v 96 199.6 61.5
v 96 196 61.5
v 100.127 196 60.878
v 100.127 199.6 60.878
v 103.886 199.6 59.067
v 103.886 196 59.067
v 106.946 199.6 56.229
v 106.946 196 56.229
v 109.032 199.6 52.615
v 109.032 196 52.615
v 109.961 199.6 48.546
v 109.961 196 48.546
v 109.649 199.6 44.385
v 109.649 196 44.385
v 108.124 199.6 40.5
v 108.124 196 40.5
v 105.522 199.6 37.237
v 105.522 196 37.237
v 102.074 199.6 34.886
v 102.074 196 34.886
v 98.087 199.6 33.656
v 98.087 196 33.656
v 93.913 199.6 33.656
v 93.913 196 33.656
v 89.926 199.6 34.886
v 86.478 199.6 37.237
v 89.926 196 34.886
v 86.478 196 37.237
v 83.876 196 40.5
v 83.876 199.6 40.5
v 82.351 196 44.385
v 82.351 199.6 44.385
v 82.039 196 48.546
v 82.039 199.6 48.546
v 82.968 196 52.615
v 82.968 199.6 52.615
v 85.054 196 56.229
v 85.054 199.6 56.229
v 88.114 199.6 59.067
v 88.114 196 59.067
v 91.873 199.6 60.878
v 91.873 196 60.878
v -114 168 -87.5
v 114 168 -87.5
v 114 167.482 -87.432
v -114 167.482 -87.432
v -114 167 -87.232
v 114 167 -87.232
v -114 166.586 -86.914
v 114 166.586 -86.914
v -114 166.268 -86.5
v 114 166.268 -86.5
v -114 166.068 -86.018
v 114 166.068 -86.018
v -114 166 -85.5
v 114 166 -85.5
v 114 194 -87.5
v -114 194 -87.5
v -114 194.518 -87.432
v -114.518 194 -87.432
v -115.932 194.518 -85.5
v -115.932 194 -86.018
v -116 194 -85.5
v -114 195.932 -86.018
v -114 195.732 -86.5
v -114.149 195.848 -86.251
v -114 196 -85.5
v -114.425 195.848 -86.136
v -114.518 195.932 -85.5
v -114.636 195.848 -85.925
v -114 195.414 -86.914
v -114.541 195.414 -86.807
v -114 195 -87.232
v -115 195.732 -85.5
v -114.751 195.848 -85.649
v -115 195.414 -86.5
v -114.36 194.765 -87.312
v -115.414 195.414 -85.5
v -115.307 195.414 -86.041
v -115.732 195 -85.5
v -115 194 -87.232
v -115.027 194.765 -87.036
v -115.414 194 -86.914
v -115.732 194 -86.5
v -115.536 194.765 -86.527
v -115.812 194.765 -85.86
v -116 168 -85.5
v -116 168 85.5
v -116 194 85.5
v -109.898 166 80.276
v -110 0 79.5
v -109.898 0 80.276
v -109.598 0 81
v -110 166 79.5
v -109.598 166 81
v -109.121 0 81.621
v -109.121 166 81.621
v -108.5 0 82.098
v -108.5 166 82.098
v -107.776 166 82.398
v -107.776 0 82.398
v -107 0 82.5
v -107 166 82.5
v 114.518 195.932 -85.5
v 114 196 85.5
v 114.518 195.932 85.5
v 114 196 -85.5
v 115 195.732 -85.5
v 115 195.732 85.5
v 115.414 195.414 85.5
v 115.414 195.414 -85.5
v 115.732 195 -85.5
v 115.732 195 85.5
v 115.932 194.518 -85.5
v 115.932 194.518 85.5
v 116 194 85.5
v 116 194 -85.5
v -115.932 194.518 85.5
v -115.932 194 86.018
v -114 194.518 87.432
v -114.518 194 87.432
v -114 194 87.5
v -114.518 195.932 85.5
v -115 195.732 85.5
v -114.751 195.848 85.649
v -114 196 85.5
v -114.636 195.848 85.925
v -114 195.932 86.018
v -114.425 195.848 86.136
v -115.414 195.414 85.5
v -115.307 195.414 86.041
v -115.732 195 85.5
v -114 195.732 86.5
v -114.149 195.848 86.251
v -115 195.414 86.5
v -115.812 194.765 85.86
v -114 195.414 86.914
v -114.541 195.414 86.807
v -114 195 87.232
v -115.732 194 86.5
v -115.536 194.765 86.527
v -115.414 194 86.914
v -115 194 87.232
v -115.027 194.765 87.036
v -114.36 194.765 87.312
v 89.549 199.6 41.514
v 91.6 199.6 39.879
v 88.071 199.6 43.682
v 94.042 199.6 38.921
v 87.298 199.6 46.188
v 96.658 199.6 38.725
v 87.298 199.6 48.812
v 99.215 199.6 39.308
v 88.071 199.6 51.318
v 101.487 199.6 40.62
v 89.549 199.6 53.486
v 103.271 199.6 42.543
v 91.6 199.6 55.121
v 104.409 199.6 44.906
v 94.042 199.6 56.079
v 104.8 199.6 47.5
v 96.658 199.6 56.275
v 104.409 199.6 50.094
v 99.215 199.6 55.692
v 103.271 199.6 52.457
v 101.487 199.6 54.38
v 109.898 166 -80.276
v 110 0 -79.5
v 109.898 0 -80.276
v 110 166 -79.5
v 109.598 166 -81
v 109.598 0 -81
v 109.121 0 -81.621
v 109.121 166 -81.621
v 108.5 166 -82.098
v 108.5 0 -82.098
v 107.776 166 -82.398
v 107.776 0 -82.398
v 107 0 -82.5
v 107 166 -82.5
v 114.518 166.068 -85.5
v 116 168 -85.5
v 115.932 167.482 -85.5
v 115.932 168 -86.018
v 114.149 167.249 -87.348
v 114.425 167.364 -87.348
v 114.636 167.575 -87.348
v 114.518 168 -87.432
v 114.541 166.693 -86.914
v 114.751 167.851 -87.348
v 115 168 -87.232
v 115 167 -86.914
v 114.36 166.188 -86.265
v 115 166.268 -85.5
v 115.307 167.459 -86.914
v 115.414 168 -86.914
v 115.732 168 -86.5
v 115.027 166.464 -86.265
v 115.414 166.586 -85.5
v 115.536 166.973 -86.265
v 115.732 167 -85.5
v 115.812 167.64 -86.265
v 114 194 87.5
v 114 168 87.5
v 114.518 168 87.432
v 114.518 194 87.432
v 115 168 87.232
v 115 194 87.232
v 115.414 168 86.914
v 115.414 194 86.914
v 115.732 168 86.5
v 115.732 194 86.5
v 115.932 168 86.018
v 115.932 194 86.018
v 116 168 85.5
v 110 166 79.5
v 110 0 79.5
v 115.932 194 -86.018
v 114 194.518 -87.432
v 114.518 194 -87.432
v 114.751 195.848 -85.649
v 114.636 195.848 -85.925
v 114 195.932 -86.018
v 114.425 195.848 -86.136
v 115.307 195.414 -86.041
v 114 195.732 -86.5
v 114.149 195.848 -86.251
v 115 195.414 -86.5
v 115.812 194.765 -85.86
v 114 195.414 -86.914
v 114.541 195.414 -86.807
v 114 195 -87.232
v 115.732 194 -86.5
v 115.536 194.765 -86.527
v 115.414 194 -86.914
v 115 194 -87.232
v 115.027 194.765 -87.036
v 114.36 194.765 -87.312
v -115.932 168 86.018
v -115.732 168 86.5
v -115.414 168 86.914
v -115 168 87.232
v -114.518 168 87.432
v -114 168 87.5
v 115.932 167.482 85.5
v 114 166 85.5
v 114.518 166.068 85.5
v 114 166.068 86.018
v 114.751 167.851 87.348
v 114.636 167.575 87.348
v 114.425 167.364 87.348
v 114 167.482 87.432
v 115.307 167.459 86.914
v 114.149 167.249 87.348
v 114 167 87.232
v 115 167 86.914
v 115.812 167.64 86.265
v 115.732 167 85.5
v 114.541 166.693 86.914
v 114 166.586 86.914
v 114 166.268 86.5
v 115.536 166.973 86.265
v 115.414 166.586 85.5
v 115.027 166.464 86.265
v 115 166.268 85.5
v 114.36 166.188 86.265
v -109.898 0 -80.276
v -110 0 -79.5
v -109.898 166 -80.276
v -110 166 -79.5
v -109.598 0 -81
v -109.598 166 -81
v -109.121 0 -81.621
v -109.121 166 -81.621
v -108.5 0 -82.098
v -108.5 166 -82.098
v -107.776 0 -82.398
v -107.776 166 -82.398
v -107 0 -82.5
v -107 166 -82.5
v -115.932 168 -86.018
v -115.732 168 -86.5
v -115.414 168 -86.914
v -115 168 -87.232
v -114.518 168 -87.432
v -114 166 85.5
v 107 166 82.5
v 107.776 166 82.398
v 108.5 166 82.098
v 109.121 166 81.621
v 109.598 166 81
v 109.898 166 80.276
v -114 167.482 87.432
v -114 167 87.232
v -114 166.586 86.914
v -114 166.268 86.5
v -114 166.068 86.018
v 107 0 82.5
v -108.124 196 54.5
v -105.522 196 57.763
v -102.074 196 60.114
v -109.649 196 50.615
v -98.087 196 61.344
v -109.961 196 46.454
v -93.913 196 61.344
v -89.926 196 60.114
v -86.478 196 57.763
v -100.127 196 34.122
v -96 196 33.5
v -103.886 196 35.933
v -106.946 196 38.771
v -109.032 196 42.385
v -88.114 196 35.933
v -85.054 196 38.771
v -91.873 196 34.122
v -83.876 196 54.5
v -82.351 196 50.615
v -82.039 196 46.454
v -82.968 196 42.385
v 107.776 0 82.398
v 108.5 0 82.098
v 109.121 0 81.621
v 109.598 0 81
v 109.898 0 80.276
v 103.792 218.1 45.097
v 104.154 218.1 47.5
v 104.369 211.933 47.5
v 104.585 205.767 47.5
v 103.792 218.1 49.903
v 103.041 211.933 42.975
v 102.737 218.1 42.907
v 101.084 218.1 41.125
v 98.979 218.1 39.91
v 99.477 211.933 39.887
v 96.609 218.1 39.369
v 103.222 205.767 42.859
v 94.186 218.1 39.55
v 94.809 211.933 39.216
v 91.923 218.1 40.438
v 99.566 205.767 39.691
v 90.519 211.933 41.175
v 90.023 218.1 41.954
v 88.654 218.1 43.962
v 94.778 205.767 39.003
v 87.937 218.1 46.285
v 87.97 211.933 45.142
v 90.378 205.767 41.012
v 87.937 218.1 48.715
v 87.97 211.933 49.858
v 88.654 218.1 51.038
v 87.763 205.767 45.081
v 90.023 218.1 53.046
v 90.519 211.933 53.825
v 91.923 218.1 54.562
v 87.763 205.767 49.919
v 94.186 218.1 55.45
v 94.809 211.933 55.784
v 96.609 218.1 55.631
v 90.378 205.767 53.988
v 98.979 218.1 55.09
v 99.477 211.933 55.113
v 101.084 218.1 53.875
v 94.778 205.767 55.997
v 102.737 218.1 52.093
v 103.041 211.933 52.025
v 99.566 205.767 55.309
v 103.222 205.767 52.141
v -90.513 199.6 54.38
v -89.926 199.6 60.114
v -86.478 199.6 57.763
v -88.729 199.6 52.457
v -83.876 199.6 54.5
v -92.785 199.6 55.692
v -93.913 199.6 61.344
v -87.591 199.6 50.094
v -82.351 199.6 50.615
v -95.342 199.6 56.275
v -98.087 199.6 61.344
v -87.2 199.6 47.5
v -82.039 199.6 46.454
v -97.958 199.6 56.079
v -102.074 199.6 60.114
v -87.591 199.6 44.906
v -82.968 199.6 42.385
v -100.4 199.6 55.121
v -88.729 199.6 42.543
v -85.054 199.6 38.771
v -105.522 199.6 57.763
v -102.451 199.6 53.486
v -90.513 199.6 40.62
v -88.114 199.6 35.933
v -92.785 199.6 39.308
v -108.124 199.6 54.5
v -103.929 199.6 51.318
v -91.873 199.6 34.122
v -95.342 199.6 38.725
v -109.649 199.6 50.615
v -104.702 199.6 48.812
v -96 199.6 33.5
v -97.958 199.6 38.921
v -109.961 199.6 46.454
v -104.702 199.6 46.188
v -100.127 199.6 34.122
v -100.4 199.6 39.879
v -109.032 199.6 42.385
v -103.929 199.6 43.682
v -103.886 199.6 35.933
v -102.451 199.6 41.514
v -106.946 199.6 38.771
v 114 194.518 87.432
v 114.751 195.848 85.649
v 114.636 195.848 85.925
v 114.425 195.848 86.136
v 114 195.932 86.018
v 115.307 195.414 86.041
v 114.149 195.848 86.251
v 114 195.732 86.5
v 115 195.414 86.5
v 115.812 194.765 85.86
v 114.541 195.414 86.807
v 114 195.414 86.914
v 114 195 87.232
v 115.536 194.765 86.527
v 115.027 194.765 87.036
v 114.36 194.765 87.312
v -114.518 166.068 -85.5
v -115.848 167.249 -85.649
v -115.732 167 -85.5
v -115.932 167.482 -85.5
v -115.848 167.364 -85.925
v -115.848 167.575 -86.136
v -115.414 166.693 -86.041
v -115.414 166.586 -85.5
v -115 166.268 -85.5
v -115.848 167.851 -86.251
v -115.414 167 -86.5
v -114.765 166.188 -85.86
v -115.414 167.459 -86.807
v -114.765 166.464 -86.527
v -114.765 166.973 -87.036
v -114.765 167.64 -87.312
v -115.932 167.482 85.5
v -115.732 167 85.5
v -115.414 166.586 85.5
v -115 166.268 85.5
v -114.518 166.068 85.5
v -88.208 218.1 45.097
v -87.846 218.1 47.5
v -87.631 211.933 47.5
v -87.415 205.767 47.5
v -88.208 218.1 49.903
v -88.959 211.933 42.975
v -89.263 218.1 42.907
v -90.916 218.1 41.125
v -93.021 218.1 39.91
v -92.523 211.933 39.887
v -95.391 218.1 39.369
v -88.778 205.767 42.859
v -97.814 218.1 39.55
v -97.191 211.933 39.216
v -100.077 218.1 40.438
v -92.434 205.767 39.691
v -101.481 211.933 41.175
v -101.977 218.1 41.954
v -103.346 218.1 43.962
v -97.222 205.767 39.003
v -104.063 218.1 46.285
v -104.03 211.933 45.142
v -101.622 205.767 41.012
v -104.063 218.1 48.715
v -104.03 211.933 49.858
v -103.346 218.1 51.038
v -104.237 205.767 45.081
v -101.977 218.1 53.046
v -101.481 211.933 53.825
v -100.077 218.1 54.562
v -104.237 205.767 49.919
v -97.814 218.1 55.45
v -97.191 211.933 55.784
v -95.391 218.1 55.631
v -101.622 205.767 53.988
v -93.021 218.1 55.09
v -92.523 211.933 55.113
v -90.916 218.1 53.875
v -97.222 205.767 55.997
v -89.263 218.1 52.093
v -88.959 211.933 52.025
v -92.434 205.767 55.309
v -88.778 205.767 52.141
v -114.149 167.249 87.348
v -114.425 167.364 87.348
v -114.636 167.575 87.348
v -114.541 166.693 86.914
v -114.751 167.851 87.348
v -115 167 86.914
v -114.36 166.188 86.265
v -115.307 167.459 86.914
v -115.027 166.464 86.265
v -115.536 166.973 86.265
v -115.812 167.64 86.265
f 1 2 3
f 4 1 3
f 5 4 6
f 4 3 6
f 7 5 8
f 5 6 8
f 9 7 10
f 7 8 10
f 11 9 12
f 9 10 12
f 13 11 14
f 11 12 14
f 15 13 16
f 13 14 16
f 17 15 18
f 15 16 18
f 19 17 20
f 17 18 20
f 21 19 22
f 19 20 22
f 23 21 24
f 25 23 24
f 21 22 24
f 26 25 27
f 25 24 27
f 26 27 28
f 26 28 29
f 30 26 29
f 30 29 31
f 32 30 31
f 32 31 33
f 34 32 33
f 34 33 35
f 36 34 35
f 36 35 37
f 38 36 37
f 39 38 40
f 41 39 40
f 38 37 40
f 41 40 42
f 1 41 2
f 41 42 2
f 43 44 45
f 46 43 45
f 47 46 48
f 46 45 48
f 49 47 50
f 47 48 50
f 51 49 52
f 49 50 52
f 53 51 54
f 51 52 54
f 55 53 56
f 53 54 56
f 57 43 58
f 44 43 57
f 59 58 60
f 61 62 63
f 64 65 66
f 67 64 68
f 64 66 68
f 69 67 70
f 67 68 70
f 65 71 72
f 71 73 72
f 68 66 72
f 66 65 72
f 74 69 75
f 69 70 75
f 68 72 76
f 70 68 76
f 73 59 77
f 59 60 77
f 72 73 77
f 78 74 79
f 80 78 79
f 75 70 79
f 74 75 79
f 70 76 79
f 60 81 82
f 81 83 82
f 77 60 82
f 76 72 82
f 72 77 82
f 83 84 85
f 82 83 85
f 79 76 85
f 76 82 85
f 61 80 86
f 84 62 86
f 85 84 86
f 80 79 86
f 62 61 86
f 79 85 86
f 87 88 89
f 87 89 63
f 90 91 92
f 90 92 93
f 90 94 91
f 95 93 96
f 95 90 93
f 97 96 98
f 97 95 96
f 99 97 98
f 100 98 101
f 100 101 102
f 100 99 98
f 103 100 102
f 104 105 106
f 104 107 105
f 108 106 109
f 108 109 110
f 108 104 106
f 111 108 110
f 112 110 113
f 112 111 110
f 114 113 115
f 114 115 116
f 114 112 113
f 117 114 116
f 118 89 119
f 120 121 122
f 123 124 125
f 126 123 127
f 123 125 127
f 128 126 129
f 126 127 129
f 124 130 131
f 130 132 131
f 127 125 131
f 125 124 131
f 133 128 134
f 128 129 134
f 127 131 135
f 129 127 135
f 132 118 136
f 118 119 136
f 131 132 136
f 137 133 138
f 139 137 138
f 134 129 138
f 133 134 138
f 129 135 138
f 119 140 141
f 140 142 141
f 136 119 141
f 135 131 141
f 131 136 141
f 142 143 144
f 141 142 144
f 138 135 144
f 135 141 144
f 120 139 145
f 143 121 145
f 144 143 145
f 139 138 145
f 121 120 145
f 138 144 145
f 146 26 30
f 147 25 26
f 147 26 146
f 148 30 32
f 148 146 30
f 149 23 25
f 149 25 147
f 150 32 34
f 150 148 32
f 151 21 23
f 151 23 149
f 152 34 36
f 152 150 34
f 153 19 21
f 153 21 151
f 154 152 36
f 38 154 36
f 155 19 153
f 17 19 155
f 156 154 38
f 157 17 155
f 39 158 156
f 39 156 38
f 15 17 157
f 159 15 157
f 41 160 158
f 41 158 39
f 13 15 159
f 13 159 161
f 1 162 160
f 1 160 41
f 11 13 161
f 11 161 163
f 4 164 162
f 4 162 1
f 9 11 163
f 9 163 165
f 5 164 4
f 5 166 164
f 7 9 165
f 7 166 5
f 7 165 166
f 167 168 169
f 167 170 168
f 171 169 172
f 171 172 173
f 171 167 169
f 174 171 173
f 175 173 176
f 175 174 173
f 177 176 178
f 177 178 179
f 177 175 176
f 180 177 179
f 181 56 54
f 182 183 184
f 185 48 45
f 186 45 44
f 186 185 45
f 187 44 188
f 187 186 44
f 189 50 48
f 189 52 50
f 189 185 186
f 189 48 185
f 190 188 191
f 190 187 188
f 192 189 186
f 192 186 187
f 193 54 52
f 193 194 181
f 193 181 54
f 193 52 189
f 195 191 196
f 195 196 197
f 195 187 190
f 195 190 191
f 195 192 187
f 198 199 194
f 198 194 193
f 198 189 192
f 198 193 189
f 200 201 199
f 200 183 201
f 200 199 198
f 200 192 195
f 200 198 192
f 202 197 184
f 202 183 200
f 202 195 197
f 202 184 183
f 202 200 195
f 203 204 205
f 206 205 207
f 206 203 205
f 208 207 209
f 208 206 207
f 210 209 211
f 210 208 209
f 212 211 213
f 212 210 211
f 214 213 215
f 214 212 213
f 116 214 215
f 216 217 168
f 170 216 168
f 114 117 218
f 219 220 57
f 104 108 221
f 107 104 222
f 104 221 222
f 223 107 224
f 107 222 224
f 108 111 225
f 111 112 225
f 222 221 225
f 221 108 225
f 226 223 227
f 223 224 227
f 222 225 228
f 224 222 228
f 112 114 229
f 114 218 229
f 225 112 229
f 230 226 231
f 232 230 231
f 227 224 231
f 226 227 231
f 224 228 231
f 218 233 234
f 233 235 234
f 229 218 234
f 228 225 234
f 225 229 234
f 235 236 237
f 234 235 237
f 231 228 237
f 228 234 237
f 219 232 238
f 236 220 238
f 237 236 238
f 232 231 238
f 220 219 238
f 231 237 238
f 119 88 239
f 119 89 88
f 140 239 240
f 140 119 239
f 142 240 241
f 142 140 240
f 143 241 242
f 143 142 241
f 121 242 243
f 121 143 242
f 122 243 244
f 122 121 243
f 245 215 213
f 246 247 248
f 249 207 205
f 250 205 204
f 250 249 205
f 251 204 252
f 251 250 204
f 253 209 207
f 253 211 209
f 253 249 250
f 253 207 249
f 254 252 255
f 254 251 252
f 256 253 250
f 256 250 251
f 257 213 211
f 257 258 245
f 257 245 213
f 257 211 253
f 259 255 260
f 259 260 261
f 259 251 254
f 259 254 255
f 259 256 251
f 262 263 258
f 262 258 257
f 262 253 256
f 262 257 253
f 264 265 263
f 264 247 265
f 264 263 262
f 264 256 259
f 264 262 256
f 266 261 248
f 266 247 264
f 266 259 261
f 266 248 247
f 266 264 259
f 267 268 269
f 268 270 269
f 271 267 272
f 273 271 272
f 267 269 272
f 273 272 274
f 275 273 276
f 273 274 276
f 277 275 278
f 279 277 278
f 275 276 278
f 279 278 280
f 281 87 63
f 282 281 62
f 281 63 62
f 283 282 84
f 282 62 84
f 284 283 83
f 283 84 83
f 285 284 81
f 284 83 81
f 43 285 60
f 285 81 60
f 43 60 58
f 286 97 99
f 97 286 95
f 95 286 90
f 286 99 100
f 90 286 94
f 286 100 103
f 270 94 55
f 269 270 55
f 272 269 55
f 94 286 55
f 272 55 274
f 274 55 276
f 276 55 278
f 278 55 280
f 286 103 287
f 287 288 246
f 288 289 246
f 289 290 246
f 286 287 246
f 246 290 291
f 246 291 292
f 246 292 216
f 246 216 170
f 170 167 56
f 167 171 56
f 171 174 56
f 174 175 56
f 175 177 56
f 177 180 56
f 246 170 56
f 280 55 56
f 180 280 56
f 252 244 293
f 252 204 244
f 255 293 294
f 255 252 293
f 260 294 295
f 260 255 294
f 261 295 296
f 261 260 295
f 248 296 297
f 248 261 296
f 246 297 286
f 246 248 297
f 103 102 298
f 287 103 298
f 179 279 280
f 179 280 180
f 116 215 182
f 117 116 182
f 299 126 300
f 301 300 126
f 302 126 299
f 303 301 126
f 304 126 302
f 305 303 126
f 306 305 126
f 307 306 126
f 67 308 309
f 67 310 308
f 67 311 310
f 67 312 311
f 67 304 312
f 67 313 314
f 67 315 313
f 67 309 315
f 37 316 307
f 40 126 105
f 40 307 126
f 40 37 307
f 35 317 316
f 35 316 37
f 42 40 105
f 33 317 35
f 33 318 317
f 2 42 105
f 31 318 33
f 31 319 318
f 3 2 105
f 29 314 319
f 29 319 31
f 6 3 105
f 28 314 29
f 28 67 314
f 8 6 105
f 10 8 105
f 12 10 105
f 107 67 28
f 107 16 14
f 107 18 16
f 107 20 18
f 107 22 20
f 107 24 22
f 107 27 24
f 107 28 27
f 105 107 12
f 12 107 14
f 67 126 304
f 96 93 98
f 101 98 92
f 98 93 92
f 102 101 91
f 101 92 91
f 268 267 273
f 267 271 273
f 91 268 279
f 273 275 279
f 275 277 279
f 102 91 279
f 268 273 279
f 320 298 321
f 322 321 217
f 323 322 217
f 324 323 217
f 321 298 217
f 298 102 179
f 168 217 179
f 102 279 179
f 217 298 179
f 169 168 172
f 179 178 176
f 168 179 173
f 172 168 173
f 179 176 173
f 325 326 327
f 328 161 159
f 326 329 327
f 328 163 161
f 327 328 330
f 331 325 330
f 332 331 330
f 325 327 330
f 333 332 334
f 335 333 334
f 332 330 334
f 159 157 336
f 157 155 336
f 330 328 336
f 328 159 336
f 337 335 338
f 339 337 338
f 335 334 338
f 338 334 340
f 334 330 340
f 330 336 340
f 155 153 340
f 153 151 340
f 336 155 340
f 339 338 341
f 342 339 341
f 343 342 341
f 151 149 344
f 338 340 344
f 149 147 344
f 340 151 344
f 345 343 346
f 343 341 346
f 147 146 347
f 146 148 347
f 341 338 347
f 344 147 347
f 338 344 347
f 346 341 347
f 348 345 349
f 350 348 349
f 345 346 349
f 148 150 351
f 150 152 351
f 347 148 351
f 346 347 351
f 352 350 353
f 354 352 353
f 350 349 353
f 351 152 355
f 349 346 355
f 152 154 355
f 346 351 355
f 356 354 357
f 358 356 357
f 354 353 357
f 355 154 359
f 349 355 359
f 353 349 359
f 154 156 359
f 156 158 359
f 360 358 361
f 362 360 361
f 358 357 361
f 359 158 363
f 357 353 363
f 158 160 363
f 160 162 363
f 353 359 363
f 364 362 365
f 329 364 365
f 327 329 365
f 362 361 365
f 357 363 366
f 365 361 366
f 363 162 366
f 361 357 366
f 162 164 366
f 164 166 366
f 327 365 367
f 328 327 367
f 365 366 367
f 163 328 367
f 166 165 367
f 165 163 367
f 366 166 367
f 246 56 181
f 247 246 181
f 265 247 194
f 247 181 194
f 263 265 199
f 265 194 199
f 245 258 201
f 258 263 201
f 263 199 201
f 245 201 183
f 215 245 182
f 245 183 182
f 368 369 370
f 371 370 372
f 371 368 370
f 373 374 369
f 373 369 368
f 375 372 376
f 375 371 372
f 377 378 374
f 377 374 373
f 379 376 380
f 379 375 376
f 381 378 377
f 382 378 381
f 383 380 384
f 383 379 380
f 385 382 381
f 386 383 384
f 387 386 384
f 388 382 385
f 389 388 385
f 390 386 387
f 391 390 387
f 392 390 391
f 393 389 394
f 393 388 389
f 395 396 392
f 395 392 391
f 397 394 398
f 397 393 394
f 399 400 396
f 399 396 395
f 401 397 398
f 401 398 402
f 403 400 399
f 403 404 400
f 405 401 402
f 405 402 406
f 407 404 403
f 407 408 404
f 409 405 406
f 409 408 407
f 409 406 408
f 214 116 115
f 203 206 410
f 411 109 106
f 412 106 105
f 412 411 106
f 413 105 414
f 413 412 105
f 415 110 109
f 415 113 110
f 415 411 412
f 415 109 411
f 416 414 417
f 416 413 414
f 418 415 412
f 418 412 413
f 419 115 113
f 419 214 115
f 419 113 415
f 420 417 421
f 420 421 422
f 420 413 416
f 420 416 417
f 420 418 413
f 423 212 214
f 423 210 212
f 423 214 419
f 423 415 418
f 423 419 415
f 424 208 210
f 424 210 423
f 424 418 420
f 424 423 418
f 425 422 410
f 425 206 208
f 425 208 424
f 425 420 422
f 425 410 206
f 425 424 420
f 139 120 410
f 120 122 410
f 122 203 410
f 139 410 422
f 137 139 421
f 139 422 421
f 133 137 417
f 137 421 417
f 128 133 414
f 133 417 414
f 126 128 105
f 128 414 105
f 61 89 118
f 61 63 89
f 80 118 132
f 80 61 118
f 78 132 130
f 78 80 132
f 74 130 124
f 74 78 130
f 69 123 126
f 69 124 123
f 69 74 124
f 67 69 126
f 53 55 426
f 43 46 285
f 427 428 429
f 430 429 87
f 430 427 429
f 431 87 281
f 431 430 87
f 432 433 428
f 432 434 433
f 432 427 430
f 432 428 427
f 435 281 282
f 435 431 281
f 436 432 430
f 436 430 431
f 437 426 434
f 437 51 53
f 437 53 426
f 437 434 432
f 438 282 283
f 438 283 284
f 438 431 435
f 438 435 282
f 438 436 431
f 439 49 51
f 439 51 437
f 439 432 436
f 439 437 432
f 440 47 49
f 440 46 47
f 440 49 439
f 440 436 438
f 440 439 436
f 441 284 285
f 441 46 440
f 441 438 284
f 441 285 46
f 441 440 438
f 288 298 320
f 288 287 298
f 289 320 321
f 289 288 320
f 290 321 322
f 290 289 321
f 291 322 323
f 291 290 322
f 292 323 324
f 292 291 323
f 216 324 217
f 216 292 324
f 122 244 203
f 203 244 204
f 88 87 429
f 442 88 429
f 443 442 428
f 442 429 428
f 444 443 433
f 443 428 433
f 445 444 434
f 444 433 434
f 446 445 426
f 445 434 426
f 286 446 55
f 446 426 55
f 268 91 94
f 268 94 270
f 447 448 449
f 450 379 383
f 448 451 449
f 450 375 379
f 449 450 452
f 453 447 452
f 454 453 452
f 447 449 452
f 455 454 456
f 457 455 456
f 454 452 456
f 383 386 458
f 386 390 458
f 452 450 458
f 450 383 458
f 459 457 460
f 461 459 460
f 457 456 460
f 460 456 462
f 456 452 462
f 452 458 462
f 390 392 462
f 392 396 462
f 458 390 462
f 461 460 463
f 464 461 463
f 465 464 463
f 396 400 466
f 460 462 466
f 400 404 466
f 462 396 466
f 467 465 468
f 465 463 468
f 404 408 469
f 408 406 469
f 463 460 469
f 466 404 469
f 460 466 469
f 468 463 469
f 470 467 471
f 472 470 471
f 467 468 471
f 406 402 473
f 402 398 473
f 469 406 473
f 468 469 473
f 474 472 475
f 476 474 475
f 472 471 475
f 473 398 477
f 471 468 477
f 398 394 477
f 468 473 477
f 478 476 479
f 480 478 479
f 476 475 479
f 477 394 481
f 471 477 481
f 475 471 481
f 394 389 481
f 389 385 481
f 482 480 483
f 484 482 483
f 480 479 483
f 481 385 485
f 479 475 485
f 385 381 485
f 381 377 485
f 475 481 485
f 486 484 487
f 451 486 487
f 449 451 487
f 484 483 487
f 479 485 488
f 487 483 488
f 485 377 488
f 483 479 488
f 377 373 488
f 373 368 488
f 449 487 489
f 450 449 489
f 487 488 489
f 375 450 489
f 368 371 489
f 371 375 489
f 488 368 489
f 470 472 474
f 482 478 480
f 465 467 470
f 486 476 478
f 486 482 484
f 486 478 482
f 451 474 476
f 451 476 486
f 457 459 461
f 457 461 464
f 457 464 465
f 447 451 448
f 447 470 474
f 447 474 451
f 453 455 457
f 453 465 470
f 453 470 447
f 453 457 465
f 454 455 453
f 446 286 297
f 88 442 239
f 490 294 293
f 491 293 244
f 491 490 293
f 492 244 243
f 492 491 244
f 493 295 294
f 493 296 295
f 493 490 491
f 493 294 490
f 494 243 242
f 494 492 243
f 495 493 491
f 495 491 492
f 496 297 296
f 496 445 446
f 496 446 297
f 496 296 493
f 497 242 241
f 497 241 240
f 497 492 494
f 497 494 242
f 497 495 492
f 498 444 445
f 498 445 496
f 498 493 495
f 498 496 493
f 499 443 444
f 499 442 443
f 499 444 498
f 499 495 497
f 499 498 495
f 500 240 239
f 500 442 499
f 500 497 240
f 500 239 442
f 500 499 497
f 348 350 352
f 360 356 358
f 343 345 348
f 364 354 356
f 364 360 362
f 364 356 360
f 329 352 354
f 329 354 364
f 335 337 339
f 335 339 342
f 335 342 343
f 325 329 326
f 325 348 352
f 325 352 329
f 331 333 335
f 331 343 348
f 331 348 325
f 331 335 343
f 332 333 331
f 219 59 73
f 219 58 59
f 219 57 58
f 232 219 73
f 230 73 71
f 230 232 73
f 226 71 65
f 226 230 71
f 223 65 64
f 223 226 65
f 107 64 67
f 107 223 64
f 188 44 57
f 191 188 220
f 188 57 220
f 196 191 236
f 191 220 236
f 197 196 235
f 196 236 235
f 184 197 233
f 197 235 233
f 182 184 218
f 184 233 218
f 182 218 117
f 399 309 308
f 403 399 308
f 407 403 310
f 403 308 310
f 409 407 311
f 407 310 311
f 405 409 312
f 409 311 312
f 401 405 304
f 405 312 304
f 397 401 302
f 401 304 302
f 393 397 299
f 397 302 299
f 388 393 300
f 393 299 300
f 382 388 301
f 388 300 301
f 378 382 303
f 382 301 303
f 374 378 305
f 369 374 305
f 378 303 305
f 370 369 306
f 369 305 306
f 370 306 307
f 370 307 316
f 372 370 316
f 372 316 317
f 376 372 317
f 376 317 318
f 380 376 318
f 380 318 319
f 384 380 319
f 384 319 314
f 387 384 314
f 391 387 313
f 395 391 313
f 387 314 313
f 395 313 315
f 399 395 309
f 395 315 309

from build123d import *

# Parameters (mm, degrees)
SKETCH_1_W                = 220
SKETCH_1_H                = 165
EXTRUDE_1_DEPTH           = 166
FILLET_1_R                = 3
SKETCH_2_W                = 232
SKETCH_2_H                = 175
EXTRUDE_2_DEPTH           = 30
FILLET_2_R                = 2
SKETCH_3_R                = 14
EXTRUDE_3_DEPTH           = 3.6
SKETCH_5_R                = 8.8
EXTRUDE_4_DEPTH           = 18.5
EXTRUDE_4_DRAFT           = 2
EXTRUDE_4_PROFILE_2_DEPTH = 18.5
EXTRUDE_4_PROFILE_2_DRAFT = 2


with BuildPart() as part:
    # Эскиз1 → Вытянуть1 (new body)
    with BuildSketch(Plane(origin=(0, 0, 0), x_dir=(1, 0, 0), z_dir=(0, 1, 0))):
        Rectangle(SKETCH_1_W, SKETCH_1_H)
    extrude(amount=EXTRUDE_1_DEPTH)

    # Скругление1
    fillet_1_edges = [part.edges().sort_by_distance(p)[0] for p in [
        (110, 83, 82.5),
        (-110, 83, 82.5),
        (-110, 83, -82.5),
        (110, 83, -82.5),
    ]]
    fillet(fillet_1_edges, radius=FILLET_1_R)

    # Эскиз2 → Вытянуть2 (add)
    with BuildSketch(Plane(origin=(0, 166, 0), x_dir=(1, 0, 0), z_dir=(0, 1, 0))):
        Rectangle(SKETCH_2_W, SKETCH_2_H)
    extrude(amount=EXTRUDE_2_DEPTH)

    # Скругление2
    fillet_2_edges = [part.edges().sort_by_distance(p)[0] for p in [
        (116, 166, 0),
        (116, 181, 87.5),
        (0, 166, -87.5),
        (116, 181, -87.5),
        (-116, 166, 0),
        (-116, 181, -87.5),
        (0, 166, 87.5),
        (-116, 181, 87.5),
        (116, 196, 0),
        (0, 196, -87.5),
        (-116, 196, 0),
        (0, 196, 87.5),
    ]]
    fillet(fillet_2_edges, radius=FILLET_2_R)

    # Эскиз3 → Вытянуть3 (add)
    with BuildSketch(Plane(origin=(0, 196, 0), x_dir=(1, 0, 0), z_dir=(0, 1, 0))):
        with Locations(Location((96, -47.5, 0), (0, 0, 270))):
            Circle(SKETCH_3_R)
        with Locations(Location((-96, -47.5, 0), (0, 0, 90))):
            Circle(SKETCH_3_R)
    extrude(amount=EXTRUDE_3_DEPTH)


with BuildPart() as extrude_4_tool:
    # Эскиз5 → Вытянуть4 (with draft: the straight prism first)
    with BuildSketch(Plane(origin=(0, 199.6, 0), x_dir=(1, 0, 0), z_dir=(0, 1, 0))):
        with Locations((96, -47.5)):
            Circle(SKETCH_5_R)
    extrude(amount=EXTRUDE_4_DEPTH)
    # Вытянуть4: the draft: its side faces are tilted about the plane it starts from
    extrude_4_sides = [extrude_4_tool.faces().sort_by_distance(p)[0] for p in [
        (87.2, 208.85, 47.5),
    ]]
    draft(extrude_4_sides, Plane(origin=(0, 199.6, 0), x_dir=(1, 0, 0), z_dir=(0, 1, 0)), EXTRUDE_4_DRAFT)


with BuildPart() as part_1:
    add(part.part)

    # Вытянуть4: add extrude_4_tool
    add(extrude_4_tool.part)


with BuildPart() as extrude_4_profile_2_tool:
    # Эскиз5 → Вытянуть4 profile 2 (with draft: the straight prism first)
    with BuildSketch(Plane(origin=(0, 199.6, 0), x_dir=(1, 0, 0), z_dir=(0, 1, 0))):
        with Locations((-96, -47.5)):
            Circle(SKETCH_5_R)
    extrude(amount=EXTRUDE_4_PROFILE_2_DEPTH)
    # Вытянуть4 profile 2: the draft: its side faces are tilted about the plane it starts from
    extrude_4_profile_2_sides = [extrude_4_profile_2_tool.faces().sort_by_distance(p)[0] for p in [
        (-104.8, 208.85, 47.5),
    ]]
    draft(extrude_4_profile_2_sides, Plane(origin=(0, 199.6, 0), x_dir=(1, 0, 0), z_dir=(0, 1, 0)), EXTRUDE_4_PROFILE_2_DRAFT)


with BuildPart() as part_2:
    add(part_1.part)

    # Вытянуть4 profile 2: add extrude_4_profile_2_tool
    add(extrude_4_profile_2_tool.part)


solid = part_2.part
